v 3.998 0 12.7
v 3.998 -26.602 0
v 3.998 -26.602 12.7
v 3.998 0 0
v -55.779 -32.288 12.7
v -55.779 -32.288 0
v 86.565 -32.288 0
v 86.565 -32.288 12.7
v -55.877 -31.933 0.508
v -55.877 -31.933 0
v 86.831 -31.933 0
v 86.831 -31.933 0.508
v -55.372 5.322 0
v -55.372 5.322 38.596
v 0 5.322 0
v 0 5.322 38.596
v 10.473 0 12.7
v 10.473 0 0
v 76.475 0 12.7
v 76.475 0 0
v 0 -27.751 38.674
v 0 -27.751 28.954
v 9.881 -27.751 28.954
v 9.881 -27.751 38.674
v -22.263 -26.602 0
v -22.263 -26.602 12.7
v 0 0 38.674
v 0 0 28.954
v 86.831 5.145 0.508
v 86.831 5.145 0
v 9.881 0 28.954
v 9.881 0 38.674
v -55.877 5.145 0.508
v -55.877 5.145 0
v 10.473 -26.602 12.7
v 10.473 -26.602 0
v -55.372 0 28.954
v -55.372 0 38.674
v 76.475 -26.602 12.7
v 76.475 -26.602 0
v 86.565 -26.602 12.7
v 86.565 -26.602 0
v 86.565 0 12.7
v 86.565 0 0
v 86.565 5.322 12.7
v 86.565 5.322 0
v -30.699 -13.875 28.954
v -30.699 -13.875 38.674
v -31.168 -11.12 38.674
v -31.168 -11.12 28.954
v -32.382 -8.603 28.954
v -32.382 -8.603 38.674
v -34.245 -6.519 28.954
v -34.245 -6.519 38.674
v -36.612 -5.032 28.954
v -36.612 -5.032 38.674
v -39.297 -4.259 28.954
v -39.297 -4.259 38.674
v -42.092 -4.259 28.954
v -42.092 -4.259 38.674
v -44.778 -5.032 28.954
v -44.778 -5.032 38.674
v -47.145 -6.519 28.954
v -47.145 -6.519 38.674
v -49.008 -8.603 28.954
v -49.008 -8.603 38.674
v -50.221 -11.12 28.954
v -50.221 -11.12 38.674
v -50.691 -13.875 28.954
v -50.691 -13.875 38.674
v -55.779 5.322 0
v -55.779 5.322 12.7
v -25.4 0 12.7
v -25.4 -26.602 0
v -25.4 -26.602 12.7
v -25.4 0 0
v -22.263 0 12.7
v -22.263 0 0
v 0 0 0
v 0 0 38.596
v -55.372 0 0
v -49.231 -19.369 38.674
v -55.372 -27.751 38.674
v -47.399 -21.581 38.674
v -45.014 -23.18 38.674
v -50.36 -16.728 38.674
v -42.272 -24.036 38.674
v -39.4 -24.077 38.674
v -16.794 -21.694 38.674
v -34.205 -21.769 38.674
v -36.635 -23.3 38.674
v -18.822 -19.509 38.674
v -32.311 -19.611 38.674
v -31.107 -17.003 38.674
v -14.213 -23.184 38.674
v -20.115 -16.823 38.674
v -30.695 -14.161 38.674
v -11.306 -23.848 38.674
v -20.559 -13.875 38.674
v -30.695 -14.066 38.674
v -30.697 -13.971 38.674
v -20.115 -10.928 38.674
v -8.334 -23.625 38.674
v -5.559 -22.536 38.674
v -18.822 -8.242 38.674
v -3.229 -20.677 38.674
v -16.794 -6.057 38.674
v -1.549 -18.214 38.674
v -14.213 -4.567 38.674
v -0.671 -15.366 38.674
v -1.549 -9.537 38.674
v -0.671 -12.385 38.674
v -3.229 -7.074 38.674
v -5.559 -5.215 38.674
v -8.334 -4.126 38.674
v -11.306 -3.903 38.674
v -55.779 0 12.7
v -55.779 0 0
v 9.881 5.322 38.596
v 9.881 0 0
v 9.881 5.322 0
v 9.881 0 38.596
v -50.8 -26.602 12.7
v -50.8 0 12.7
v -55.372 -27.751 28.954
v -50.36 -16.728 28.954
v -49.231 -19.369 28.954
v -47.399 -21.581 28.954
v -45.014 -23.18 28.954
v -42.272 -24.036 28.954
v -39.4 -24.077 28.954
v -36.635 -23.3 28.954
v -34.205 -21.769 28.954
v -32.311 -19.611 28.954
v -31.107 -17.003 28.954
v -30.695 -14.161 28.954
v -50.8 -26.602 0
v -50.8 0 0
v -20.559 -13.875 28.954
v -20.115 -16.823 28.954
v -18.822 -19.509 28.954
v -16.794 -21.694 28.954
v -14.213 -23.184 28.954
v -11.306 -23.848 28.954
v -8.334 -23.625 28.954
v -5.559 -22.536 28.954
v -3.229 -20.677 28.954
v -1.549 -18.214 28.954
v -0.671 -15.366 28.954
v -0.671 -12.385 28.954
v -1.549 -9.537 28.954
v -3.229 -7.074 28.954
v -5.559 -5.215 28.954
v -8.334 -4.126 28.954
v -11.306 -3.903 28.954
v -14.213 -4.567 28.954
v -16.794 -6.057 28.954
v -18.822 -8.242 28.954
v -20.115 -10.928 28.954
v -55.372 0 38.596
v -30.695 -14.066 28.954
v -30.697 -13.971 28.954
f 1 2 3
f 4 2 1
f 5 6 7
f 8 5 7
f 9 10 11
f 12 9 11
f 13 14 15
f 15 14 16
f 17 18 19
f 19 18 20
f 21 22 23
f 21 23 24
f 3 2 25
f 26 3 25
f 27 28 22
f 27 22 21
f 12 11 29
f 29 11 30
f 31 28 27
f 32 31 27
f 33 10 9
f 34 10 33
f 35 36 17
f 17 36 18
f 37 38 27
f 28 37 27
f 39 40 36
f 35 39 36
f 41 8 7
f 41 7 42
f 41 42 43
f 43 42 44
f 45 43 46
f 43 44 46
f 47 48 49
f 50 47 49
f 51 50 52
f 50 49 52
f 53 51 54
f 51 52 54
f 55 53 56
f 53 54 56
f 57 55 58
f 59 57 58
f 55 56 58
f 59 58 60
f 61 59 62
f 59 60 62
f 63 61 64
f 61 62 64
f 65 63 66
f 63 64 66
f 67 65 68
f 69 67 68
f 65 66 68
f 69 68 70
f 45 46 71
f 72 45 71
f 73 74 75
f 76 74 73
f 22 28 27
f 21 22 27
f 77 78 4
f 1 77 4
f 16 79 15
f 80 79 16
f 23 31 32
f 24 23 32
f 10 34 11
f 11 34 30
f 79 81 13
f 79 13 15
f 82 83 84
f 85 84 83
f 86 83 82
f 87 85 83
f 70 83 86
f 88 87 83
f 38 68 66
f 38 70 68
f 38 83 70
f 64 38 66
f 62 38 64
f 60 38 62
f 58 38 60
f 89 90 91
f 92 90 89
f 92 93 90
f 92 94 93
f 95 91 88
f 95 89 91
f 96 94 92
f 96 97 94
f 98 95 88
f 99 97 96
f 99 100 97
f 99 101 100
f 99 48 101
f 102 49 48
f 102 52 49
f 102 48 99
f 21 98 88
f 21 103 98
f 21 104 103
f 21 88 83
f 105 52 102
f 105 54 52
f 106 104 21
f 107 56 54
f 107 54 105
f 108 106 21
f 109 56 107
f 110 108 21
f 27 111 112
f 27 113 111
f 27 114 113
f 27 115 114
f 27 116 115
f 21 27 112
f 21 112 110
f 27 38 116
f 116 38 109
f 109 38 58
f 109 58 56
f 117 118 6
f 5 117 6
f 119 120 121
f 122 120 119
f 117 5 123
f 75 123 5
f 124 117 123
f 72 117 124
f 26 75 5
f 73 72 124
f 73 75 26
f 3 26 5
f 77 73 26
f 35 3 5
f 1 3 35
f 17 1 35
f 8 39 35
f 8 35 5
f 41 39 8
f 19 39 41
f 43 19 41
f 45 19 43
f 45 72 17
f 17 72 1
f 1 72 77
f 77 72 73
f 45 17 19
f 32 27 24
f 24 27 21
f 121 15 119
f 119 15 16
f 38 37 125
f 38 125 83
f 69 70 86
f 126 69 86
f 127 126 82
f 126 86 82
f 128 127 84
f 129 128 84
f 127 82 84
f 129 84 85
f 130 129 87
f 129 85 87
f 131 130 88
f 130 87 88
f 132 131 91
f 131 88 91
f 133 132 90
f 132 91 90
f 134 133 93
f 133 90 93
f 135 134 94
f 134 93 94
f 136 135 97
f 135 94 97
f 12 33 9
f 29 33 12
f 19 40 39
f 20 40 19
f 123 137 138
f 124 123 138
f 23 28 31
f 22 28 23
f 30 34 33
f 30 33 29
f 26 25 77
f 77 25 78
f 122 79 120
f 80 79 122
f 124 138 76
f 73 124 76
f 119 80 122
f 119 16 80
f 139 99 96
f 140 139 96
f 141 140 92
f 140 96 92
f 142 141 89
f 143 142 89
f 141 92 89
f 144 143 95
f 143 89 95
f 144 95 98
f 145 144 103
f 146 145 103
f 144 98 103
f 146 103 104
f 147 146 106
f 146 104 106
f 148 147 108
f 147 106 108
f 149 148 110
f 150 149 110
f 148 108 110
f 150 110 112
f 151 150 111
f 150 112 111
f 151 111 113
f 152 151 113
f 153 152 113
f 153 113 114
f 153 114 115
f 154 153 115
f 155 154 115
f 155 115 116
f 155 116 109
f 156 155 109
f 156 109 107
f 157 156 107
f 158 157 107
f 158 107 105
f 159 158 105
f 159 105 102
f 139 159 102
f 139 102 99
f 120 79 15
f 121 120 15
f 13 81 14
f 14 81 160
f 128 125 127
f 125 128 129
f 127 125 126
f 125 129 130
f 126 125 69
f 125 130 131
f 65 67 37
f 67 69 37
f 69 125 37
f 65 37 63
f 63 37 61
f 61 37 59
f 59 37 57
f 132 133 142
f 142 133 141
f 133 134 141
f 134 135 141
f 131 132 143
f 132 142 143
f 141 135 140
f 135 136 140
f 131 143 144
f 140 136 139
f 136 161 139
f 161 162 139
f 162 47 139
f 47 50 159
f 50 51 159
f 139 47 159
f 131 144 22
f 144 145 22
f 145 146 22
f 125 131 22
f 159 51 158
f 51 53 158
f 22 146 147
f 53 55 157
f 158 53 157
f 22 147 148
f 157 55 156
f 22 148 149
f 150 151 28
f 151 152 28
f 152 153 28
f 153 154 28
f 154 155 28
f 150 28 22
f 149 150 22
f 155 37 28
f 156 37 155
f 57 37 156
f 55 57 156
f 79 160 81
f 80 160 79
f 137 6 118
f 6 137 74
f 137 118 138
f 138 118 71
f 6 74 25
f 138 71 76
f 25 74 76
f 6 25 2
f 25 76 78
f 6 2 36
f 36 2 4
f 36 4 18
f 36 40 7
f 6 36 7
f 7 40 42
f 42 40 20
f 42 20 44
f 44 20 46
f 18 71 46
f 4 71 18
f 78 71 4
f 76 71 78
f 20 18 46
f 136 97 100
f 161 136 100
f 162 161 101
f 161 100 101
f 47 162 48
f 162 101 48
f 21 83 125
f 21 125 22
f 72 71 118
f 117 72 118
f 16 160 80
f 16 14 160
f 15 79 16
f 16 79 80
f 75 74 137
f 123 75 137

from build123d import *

# Parameters (mm, degrees)
F0_W       = 4.9786263525
F0_H       = 26.6018912433
F0_W_2     = 3.1365140617
F0_W_3     = 6.4744432457
F0_W_4     = 10.0902765989
F1_DEPTH   = 12.7
F2_W       = 142.7084766328
F2_H       = 37.0778064243
F3_DEPTH   = 0.508
F4_W       = 55.372
F4_H       = 57.9078740149
F5_DEPTH   = 5.3221732378
F6_W       = 55.372
F6_H       = 9.7205181286
F7_DEPTH   = 27.75094
F9_DEPTH   = 10.61823
F10_DEPTH  = 9.88126
F11_DEPTH  = 9.88126
F5_FACE2_W = 55.372
F5_FACE2_H = 5.3221732378
F10_FACE_W = 9.88126
F10_FACE_H = 5.3221732378
F12_DEPTH  = 19.31216


with BuildPart() as f1:
    # F0 (on Top) → F1 (new body)
    with BuildSketch(Plane.XY):
        with Locations((-53.2893131763, -13.3009456217)):
            Rectangle(F0_W, F0_H)
        Polygon((10.4725733399, -26.6018912433), (3.9981300943, -26.6018912433), (0, -26.6018912433), (-22.2634859383, -26.6018912433), (-25.4, -26.6018912433), (-50.8, -26.6018912433), (-55.7786263525, -26.6018912433), (-55.7786263525, -32.287850976), (-24.910023436, -32.287850976), (0, -32.287850976), (10.4725733399, -32.287850976), (86.5653529763, -32.287850976), (86.5653529763, -26.6018912433), (76.4750763774, -26.6018912433), align=None)
        Polygon((-22.2634859383, 0), (0, 0), (3.9981300943, 0), (10.4725733399, 0), (76.4750763774, 0), (86.5653529763, 0), (86.5653529763, 5.3221732378), (-55.7786263525, 5.3221732378), (-55.7786263525, 0), (-50.8, 0), (-25.4, 0), align=None)
        with Locations((-23.8317429692, -13.3009456217)):
            Rectangle(F0_W_2, F0_H)
        with Locations((7.2353517171, -13.3009456217)):
            Rectangle(F0_W_3, F0_H)
        with Locations((81.5202146769, -13.3009456217)):
            Rectangle(F0_W_4, F0_H)
    extrude(amount=F1_DEPTH)


with BuildPart() as f3:
    # F2 (on Top) → F3 (new body)
    with BuildSketch(Plane.XY):
        with Locations((15.4770556837, -13.3941362146)):
            Rectangle(F2_W, F2_H)
    extrude(amount=F3_DEPTH)


with BuildPart() as f5:
    # F4 (on Front) → F5 (new body, through all)
    with BuildSketch(Plane.XZ):
        with Locations((-27.686, 28.9539370074)):
            Rectangle(F4_W, F4_H)
    extrude(amount=-F5_DEPTH)


with BuildPart() as f7:
    # F6 (on face) → F7 (new body)
    with BuildSketch(Plane.XZ):
        with Locations((-27.686, 33.8141960718)):
            Rectangle(F6_W, F6_H)
    extrude(amount=F7_DEPTH)

    # F8 (on face) → F9 (cut)
    with BuildSketch(Plane.XY.offset(38.6744551361)):
        with BuildLine():
            ThreePointArc((-50.6908426751, -13.87547), (-40.8375723886, -24.1597420764), (-30.6949130145, -14.160759713))
            ThreePointArc((-30.6949130145, -14.160759713), (-30.6959306511, -14.018100339), (-30.6989833539, -13.87547))
            Line((-30.6989833539, -13.87547), (-50.6908426751, -13.87547))
        make_face()
        with BuildLine():
            ThreePointArc((-0.5591397732, -13.87547), (-10.5591397732, -3.87547), (-20.5591397732, -13.87547))
            Line((-20.5591397732, -13.87547), (-0.5591397732, -13.87547))
        make_face()
        with BuildLine():
            Line((-0.5591397732, -13.87547), (-20.5591397732, -13.87547))
            ThreePointArc((-20.5591397732, -13.87547), (-10.5591397732, -23.87547), (-0.5591397732, -13.87547))
        make_face()
        with BuildLine():
            Line((-50.6908426751, -13.87547), (-30.6989833539, -13.87547))
            ThreePointArc((-30.6989833539, -13.87547), (-40.6949130145, -4.160759713), (-50.6908426751, -13.87547))
        make_face()
    extrude(amount=-F9_DEPTH, mode=Mode.SUBTRACT)


with BuildPart() as f10:
    # F10 (new): a face of the model
    f10_faces = [f5.part.faces().sort_by_distance(p)[0] for p in [
        (0, 2.6610866189, 28.9539370074),
    ]]
    extrude(f10_faces, amount=F10_DEPTH)


with BuildPart() as f11:
    # F11 (new, through all): a face of the model
    f11_faces = [f7.part.faces().sort_by_distance(p)[0] for p in [
        (0, -13.87547, 33.8141960718),
    ]]
    extrude(f11_faces, amount=F11_DEPTH)


with BuildPart() as f12_tool:
    # F5_face2 (on face) + F10_face (on face) → F12 (new body)
    with BuildSketch(Plane(origin=(-27.686, 2.6610866189, 57.9078740149), x_dir=(1, 0, 0), z_dir=(0, 0, 1))):
        Rectangle(F5_FACE2_W, F5_FACE2_H)
    with BuildSketch(Plane(origin=(4.94063, 2.6610866189, 57.9078740149), x_dir=(1, 0, 0), z_dir=(0, 0, 1))):
        Rectangle(F10_FACE_W, F10_FACE_H)
    extrude(amount=-F12_DEPTH)


with BuildPart() as f5_1:
    add(f5.part)

    # F12: cut by f12_tool
    add(f12_tool.part, mode=Mode.SUBTRACT)


with BuildPart() as f10_1:
    add(f10.part)

    # F12: cut by f12_tool
    add(f12_tool.part, mode=Mode.SUBTRACT)


solid = Compound([f1.part, f3.part, f7.part, f11.part, f5_1.part, f10_1.part])
